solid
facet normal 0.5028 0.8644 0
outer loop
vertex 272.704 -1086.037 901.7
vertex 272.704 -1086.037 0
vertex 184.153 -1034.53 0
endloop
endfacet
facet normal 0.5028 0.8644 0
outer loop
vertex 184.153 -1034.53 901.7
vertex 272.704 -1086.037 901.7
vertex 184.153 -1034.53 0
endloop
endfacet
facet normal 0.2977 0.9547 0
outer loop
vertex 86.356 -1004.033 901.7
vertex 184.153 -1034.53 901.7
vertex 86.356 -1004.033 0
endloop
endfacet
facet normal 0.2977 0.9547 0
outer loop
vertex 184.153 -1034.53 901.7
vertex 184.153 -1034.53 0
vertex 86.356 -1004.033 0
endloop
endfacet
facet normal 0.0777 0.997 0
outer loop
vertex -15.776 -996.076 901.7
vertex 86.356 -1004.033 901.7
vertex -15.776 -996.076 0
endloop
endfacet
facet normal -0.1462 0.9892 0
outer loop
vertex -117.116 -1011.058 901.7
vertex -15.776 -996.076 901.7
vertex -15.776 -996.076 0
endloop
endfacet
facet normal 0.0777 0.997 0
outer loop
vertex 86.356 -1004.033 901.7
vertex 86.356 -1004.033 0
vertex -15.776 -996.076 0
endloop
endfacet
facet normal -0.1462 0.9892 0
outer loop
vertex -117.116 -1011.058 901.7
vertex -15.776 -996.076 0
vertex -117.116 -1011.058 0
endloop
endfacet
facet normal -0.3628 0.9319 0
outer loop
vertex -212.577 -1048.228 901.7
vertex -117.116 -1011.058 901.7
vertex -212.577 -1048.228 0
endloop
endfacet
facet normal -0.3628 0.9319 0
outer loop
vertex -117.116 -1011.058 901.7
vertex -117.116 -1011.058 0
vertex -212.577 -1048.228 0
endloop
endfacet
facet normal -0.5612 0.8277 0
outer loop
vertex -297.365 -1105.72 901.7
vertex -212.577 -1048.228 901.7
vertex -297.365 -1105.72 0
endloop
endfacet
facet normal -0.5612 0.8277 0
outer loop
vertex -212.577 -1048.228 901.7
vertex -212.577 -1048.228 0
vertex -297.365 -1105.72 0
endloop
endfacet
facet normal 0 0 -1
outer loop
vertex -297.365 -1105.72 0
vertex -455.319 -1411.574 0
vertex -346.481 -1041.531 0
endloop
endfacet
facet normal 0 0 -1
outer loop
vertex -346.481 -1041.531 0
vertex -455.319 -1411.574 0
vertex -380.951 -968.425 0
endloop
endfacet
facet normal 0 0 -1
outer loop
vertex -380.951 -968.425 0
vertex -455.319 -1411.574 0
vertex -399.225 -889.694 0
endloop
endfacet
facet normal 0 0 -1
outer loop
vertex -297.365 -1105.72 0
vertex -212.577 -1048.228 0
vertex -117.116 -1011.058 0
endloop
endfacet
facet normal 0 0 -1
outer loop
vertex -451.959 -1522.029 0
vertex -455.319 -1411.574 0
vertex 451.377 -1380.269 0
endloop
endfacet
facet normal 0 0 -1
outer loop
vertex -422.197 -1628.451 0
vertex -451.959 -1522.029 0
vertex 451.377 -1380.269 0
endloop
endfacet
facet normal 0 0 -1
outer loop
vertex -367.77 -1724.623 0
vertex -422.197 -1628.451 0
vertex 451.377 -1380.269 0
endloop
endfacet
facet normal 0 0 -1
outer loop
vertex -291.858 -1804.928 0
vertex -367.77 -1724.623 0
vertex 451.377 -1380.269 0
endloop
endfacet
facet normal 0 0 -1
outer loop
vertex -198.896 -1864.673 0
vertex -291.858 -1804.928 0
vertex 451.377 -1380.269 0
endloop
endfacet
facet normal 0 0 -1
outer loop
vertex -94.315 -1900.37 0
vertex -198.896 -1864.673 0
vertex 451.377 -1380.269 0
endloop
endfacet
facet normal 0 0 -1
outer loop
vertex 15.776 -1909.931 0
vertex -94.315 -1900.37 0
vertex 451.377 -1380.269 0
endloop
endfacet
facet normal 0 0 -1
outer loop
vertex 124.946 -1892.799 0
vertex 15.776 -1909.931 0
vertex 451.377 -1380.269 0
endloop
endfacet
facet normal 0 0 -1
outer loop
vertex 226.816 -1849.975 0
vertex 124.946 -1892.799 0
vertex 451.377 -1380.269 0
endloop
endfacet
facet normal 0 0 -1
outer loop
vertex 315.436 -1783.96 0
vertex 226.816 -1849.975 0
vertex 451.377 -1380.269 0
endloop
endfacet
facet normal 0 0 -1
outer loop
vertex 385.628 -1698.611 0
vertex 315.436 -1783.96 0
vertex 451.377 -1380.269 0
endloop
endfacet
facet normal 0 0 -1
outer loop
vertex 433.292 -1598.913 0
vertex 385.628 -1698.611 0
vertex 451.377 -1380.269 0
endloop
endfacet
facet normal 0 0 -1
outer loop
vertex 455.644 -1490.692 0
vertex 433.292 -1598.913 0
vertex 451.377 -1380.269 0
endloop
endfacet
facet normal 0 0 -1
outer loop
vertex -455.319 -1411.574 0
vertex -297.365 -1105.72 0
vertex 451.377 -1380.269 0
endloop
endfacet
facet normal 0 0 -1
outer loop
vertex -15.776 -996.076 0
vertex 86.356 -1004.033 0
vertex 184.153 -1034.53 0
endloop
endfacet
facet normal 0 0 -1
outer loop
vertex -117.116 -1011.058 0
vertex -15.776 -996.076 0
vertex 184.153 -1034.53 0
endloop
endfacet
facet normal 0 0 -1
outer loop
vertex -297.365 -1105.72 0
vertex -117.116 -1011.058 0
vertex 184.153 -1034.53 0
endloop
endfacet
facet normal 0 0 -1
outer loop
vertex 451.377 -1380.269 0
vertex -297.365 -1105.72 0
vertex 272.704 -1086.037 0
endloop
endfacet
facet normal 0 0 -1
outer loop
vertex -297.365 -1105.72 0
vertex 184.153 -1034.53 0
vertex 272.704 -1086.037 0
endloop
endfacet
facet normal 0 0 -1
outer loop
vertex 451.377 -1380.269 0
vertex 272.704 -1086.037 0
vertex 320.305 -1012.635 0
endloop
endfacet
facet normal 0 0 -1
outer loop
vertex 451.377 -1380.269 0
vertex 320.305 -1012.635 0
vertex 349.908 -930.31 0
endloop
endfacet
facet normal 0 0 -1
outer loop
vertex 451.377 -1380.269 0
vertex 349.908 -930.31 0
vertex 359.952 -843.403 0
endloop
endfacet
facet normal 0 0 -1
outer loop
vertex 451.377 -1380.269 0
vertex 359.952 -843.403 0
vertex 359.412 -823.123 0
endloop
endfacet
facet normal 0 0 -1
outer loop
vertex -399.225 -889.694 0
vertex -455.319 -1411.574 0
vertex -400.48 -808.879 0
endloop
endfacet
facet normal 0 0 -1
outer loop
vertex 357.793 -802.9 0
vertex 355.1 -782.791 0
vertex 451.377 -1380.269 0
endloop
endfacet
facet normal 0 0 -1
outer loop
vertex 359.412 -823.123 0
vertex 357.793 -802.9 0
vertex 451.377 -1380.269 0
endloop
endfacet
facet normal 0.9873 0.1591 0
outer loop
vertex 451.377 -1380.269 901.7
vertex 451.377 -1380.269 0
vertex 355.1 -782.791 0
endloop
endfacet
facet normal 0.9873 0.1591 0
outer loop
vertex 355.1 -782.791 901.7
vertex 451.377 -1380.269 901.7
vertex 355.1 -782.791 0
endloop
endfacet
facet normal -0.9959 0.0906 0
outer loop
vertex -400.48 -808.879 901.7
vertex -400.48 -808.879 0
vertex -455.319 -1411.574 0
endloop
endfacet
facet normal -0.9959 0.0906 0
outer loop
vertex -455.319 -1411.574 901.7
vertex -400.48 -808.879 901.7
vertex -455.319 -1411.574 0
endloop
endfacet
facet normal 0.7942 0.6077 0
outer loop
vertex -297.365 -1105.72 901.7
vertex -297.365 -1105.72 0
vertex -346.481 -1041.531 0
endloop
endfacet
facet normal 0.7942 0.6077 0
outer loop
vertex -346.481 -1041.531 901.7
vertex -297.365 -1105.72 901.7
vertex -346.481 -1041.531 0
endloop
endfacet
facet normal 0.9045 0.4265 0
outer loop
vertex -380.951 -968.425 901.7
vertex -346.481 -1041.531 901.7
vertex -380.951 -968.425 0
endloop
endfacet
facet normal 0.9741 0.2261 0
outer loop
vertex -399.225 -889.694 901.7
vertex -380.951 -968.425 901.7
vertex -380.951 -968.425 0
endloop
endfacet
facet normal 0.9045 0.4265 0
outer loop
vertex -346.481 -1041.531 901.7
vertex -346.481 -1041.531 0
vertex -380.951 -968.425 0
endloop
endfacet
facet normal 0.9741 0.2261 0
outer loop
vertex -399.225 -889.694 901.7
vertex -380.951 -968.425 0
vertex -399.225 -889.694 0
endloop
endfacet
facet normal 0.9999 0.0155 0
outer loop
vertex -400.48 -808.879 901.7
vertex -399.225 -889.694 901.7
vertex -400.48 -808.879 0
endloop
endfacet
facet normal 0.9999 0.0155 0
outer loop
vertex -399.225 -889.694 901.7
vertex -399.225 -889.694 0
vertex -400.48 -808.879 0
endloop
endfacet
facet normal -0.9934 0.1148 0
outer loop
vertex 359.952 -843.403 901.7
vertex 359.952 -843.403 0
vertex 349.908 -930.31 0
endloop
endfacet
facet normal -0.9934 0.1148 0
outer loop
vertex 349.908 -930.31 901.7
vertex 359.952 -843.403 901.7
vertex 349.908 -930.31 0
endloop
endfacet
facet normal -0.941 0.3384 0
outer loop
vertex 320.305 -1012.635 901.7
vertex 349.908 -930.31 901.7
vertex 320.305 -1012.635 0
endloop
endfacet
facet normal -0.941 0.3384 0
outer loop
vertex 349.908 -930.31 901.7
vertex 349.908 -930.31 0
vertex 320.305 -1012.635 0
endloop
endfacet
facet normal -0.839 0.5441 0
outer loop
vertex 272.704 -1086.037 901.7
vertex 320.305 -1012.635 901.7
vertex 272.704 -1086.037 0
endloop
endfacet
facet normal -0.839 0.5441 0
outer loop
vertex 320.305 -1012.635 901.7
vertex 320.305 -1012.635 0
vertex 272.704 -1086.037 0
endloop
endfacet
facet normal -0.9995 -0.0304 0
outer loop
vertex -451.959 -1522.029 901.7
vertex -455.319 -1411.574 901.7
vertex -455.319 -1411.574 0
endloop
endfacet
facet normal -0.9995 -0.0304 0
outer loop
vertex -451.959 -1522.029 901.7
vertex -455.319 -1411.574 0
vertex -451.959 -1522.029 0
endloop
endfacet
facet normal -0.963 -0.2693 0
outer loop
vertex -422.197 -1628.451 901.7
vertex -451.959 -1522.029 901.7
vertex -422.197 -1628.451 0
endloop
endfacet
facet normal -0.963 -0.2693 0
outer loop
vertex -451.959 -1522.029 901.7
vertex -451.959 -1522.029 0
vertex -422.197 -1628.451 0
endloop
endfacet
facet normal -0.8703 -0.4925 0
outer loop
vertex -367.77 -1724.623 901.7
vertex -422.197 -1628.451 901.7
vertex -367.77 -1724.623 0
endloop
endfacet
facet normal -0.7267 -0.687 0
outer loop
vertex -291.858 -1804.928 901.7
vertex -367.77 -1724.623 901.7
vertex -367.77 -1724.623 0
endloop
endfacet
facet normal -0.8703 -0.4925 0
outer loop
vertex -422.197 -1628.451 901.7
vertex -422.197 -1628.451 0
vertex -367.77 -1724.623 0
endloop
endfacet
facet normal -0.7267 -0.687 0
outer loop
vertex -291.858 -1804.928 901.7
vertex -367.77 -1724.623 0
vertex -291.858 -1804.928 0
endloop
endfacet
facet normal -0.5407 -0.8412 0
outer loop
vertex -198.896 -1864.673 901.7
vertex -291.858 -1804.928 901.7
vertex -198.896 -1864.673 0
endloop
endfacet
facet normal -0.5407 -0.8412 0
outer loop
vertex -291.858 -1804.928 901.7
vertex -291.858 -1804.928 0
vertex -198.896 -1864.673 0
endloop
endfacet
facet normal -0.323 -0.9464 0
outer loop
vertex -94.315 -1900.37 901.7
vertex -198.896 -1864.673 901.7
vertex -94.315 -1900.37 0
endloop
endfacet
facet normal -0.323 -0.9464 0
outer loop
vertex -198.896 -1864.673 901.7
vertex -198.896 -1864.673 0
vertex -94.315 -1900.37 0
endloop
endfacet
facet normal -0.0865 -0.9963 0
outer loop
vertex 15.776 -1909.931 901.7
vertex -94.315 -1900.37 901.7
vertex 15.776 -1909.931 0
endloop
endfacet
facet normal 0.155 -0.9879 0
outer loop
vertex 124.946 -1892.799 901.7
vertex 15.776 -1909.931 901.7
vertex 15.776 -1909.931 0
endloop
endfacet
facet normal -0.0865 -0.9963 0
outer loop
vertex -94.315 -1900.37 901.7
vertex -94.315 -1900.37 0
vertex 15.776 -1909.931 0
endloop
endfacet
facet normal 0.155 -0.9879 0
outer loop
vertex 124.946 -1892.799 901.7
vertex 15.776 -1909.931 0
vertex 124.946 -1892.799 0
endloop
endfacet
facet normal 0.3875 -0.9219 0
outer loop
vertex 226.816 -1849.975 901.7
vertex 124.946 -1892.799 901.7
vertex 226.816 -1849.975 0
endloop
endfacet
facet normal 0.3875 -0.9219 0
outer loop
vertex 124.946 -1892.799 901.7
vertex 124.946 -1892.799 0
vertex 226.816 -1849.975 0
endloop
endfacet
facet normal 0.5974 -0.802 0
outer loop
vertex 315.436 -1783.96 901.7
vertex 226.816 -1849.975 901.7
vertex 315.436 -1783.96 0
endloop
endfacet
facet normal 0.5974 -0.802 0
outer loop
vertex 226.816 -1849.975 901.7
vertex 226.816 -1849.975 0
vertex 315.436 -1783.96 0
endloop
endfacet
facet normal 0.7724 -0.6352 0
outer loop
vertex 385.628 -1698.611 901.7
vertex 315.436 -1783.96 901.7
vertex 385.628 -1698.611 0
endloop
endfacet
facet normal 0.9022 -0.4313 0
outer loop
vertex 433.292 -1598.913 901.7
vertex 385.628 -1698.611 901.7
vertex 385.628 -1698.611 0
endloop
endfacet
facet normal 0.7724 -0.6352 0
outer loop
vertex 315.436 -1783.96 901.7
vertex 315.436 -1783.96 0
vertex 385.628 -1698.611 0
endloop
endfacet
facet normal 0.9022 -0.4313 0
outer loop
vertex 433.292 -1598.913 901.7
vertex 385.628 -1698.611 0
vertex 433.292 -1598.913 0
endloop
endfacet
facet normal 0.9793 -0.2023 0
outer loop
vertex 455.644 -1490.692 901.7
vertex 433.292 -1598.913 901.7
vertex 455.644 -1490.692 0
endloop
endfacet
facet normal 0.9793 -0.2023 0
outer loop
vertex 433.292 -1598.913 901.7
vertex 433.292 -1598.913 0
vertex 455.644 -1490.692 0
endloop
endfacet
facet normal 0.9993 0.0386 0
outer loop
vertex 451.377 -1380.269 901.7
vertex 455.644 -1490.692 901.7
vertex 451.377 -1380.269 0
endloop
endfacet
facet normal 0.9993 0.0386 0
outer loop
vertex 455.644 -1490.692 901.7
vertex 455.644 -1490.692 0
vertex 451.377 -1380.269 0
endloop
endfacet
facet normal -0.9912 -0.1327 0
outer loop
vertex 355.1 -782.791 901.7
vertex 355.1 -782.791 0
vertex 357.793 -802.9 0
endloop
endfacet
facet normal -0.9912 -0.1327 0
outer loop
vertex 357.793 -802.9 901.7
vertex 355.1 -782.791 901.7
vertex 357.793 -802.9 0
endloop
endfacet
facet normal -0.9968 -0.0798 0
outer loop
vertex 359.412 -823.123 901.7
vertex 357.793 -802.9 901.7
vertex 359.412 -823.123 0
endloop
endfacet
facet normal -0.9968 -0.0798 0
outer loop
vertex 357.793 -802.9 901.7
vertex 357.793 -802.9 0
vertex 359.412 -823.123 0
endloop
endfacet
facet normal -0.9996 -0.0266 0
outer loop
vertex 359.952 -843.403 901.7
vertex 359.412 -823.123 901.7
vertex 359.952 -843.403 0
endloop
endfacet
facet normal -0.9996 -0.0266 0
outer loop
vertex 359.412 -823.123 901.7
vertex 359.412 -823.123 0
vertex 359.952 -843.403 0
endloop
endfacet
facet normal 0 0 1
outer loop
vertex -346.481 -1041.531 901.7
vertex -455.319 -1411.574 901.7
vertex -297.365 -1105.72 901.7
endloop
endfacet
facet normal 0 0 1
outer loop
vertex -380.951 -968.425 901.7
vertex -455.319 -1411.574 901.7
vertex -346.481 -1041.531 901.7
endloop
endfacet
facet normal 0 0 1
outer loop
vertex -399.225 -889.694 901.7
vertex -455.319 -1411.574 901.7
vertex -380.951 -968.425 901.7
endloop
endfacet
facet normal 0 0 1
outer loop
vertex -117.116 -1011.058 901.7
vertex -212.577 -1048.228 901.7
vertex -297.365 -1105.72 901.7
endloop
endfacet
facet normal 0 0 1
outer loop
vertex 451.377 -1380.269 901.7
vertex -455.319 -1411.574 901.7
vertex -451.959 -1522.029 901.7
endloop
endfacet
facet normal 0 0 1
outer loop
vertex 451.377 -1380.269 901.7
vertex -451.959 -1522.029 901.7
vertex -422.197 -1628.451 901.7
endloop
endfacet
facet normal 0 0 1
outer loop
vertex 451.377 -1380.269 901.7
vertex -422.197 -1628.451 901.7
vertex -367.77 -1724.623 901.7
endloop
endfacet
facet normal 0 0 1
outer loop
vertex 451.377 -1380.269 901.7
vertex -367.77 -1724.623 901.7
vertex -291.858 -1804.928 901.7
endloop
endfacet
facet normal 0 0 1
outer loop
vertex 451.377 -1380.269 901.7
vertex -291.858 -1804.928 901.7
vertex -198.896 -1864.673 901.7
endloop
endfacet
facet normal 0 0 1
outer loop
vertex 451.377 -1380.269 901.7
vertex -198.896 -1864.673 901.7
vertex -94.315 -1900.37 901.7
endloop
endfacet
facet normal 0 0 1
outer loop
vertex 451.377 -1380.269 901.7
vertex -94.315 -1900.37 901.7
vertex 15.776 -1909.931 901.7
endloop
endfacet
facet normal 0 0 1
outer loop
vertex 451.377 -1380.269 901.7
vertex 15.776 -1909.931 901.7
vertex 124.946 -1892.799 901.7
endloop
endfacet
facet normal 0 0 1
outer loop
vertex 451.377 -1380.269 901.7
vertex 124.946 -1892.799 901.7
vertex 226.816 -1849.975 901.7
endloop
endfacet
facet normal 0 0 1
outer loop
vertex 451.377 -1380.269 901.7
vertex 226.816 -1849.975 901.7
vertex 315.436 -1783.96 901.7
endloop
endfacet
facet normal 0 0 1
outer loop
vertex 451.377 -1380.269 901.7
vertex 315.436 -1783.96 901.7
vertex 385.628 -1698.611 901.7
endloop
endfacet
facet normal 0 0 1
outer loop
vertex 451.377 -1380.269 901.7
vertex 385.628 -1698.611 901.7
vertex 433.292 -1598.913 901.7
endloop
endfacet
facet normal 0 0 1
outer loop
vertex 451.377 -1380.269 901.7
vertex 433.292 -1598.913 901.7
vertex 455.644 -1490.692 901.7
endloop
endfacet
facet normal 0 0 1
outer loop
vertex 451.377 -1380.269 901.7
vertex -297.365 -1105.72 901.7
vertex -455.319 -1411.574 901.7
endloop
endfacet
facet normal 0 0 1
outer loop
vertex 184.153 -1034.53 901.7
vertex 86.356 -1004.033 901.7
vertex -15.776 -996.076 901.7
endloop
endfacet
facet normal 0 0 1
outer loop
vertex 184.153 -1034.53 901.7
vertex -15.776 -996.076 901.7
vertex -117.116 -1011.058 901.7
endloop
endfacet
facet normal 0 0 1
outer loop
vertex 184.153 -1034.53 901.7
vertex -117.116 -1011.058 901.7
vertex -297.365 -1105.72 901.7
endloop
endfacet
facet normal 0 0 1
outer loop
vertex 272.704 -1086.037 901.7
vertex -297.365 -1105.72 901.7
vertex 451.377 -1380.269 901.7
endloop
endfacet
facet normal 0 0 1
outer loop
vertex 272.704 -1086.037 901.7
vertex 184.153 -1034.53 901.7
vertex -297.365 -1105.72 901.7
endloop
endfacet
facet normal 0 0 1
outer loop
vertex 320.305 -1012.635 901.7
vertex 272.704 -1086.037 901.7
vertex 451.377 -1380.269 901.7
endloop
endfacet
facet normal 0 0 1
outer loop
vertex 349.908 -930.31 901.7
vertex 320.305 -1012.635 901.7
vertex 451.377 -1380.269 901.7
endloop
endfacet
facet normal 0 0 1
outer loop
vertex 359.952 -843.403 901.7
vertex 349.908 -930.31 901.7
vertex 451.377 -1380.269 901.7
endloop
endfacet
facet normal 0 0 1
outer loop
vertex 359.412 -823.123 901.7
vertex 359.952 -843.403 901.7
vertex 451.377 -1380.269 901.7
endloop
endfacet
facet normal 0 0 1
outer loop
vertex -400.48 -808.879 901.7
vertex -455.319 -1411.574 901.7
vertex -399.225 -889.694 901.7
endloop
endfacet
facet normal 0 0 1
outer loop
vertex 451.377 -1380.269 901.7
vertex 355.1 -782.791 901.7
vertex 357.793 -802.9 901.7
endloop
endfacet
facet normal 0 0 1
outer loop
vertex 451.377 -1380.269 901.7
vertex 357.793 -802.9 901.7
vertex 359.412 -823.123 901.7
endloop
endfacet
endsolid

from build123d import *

# Parameters (mm, degrees)
F1_DEPTH = 901.7


# Not quite as in the source:
# - a feature names something its author has since deleted; it is built from what else it names


with BuildPart() as f1:
    # F0 (on Top) → F1 (new body)
    with BuildSketch(Plane.XY):
        with BuildLine():
            ThreePointArc((-297.3647676133, -1105.7196050937), (-380.9510446566, -968.4252745053), (-400.480099263, -808.8789961161))
            Line((-400.480099263, -808.8789961161), (-455.3190686334, -1411.5741151153))
            ThreePointArc((-455.3190686334, -1411.5741151153), (-406.2265189052, -1243.2133743356), (-297.3647676132, -1105.7196050937))
        make_face()
        with BuildLine():
            ThreePointArc((-297.3647676133, -1105.7196050937), (-7.9006621425, -1224.1765088207), (272.7039865955, -1086.0369507529))
            ThreePointArc((272.7039865955, -1086.0369507529), (-15.7762559112, -996.0756718787), (-297.3647676132, -1105.7196050937))
        make_face()
        with BuildLine():
            ThreePointArc((355.1002524449, -782.7912184935), (358.7374692929, -813.000356121), (359.9524579315, -843.4034011198))
            ThreePointArc((359.9524579315, -843.4034011198), (337.477444802, -972.3252138184), (272.7039865955, -1086.0369507529))
            ThreePointArc((272.7039865955, -1086.0369507529), (390.7896356908, -1215.6949507084), (451.377353416, -1380.2687819682))
            Line((451.377353416, -1380.2687819682), (355.1002524449, -782.7912184935))
        make_face()
        with BuildLine():
            ThreePointArc((451.377353416, -1380.2687819682), (390.7896356908, -1215.6949507084), (272.7039865955, -1086.0369507529))
            ThreePointArc((272.7039865955, -1086.0369507529), (-7.9006621425, -1224.1765088207), (-297.3647676133, -1105.7196050937))
            ThreePointArc((-297.3647676132, -1105.7196050937), (-406.2265189052, -1243.2133743356), (-455.3190686334, -1411.5741151153))
            ThreePointArc((-455.3190686334, -1411.5741151153), (-20.7359810574, -1909.7329262105), (457.2, -1453.0034011198))
            ThreePointArc((457.2, -1453.0034011198), (455.7420136337, -1416.5197471212), (451.377353416, -1380.2687819682))
        make_face()
    extrude(amount=F1_DEPTH)


solid = f1.part
